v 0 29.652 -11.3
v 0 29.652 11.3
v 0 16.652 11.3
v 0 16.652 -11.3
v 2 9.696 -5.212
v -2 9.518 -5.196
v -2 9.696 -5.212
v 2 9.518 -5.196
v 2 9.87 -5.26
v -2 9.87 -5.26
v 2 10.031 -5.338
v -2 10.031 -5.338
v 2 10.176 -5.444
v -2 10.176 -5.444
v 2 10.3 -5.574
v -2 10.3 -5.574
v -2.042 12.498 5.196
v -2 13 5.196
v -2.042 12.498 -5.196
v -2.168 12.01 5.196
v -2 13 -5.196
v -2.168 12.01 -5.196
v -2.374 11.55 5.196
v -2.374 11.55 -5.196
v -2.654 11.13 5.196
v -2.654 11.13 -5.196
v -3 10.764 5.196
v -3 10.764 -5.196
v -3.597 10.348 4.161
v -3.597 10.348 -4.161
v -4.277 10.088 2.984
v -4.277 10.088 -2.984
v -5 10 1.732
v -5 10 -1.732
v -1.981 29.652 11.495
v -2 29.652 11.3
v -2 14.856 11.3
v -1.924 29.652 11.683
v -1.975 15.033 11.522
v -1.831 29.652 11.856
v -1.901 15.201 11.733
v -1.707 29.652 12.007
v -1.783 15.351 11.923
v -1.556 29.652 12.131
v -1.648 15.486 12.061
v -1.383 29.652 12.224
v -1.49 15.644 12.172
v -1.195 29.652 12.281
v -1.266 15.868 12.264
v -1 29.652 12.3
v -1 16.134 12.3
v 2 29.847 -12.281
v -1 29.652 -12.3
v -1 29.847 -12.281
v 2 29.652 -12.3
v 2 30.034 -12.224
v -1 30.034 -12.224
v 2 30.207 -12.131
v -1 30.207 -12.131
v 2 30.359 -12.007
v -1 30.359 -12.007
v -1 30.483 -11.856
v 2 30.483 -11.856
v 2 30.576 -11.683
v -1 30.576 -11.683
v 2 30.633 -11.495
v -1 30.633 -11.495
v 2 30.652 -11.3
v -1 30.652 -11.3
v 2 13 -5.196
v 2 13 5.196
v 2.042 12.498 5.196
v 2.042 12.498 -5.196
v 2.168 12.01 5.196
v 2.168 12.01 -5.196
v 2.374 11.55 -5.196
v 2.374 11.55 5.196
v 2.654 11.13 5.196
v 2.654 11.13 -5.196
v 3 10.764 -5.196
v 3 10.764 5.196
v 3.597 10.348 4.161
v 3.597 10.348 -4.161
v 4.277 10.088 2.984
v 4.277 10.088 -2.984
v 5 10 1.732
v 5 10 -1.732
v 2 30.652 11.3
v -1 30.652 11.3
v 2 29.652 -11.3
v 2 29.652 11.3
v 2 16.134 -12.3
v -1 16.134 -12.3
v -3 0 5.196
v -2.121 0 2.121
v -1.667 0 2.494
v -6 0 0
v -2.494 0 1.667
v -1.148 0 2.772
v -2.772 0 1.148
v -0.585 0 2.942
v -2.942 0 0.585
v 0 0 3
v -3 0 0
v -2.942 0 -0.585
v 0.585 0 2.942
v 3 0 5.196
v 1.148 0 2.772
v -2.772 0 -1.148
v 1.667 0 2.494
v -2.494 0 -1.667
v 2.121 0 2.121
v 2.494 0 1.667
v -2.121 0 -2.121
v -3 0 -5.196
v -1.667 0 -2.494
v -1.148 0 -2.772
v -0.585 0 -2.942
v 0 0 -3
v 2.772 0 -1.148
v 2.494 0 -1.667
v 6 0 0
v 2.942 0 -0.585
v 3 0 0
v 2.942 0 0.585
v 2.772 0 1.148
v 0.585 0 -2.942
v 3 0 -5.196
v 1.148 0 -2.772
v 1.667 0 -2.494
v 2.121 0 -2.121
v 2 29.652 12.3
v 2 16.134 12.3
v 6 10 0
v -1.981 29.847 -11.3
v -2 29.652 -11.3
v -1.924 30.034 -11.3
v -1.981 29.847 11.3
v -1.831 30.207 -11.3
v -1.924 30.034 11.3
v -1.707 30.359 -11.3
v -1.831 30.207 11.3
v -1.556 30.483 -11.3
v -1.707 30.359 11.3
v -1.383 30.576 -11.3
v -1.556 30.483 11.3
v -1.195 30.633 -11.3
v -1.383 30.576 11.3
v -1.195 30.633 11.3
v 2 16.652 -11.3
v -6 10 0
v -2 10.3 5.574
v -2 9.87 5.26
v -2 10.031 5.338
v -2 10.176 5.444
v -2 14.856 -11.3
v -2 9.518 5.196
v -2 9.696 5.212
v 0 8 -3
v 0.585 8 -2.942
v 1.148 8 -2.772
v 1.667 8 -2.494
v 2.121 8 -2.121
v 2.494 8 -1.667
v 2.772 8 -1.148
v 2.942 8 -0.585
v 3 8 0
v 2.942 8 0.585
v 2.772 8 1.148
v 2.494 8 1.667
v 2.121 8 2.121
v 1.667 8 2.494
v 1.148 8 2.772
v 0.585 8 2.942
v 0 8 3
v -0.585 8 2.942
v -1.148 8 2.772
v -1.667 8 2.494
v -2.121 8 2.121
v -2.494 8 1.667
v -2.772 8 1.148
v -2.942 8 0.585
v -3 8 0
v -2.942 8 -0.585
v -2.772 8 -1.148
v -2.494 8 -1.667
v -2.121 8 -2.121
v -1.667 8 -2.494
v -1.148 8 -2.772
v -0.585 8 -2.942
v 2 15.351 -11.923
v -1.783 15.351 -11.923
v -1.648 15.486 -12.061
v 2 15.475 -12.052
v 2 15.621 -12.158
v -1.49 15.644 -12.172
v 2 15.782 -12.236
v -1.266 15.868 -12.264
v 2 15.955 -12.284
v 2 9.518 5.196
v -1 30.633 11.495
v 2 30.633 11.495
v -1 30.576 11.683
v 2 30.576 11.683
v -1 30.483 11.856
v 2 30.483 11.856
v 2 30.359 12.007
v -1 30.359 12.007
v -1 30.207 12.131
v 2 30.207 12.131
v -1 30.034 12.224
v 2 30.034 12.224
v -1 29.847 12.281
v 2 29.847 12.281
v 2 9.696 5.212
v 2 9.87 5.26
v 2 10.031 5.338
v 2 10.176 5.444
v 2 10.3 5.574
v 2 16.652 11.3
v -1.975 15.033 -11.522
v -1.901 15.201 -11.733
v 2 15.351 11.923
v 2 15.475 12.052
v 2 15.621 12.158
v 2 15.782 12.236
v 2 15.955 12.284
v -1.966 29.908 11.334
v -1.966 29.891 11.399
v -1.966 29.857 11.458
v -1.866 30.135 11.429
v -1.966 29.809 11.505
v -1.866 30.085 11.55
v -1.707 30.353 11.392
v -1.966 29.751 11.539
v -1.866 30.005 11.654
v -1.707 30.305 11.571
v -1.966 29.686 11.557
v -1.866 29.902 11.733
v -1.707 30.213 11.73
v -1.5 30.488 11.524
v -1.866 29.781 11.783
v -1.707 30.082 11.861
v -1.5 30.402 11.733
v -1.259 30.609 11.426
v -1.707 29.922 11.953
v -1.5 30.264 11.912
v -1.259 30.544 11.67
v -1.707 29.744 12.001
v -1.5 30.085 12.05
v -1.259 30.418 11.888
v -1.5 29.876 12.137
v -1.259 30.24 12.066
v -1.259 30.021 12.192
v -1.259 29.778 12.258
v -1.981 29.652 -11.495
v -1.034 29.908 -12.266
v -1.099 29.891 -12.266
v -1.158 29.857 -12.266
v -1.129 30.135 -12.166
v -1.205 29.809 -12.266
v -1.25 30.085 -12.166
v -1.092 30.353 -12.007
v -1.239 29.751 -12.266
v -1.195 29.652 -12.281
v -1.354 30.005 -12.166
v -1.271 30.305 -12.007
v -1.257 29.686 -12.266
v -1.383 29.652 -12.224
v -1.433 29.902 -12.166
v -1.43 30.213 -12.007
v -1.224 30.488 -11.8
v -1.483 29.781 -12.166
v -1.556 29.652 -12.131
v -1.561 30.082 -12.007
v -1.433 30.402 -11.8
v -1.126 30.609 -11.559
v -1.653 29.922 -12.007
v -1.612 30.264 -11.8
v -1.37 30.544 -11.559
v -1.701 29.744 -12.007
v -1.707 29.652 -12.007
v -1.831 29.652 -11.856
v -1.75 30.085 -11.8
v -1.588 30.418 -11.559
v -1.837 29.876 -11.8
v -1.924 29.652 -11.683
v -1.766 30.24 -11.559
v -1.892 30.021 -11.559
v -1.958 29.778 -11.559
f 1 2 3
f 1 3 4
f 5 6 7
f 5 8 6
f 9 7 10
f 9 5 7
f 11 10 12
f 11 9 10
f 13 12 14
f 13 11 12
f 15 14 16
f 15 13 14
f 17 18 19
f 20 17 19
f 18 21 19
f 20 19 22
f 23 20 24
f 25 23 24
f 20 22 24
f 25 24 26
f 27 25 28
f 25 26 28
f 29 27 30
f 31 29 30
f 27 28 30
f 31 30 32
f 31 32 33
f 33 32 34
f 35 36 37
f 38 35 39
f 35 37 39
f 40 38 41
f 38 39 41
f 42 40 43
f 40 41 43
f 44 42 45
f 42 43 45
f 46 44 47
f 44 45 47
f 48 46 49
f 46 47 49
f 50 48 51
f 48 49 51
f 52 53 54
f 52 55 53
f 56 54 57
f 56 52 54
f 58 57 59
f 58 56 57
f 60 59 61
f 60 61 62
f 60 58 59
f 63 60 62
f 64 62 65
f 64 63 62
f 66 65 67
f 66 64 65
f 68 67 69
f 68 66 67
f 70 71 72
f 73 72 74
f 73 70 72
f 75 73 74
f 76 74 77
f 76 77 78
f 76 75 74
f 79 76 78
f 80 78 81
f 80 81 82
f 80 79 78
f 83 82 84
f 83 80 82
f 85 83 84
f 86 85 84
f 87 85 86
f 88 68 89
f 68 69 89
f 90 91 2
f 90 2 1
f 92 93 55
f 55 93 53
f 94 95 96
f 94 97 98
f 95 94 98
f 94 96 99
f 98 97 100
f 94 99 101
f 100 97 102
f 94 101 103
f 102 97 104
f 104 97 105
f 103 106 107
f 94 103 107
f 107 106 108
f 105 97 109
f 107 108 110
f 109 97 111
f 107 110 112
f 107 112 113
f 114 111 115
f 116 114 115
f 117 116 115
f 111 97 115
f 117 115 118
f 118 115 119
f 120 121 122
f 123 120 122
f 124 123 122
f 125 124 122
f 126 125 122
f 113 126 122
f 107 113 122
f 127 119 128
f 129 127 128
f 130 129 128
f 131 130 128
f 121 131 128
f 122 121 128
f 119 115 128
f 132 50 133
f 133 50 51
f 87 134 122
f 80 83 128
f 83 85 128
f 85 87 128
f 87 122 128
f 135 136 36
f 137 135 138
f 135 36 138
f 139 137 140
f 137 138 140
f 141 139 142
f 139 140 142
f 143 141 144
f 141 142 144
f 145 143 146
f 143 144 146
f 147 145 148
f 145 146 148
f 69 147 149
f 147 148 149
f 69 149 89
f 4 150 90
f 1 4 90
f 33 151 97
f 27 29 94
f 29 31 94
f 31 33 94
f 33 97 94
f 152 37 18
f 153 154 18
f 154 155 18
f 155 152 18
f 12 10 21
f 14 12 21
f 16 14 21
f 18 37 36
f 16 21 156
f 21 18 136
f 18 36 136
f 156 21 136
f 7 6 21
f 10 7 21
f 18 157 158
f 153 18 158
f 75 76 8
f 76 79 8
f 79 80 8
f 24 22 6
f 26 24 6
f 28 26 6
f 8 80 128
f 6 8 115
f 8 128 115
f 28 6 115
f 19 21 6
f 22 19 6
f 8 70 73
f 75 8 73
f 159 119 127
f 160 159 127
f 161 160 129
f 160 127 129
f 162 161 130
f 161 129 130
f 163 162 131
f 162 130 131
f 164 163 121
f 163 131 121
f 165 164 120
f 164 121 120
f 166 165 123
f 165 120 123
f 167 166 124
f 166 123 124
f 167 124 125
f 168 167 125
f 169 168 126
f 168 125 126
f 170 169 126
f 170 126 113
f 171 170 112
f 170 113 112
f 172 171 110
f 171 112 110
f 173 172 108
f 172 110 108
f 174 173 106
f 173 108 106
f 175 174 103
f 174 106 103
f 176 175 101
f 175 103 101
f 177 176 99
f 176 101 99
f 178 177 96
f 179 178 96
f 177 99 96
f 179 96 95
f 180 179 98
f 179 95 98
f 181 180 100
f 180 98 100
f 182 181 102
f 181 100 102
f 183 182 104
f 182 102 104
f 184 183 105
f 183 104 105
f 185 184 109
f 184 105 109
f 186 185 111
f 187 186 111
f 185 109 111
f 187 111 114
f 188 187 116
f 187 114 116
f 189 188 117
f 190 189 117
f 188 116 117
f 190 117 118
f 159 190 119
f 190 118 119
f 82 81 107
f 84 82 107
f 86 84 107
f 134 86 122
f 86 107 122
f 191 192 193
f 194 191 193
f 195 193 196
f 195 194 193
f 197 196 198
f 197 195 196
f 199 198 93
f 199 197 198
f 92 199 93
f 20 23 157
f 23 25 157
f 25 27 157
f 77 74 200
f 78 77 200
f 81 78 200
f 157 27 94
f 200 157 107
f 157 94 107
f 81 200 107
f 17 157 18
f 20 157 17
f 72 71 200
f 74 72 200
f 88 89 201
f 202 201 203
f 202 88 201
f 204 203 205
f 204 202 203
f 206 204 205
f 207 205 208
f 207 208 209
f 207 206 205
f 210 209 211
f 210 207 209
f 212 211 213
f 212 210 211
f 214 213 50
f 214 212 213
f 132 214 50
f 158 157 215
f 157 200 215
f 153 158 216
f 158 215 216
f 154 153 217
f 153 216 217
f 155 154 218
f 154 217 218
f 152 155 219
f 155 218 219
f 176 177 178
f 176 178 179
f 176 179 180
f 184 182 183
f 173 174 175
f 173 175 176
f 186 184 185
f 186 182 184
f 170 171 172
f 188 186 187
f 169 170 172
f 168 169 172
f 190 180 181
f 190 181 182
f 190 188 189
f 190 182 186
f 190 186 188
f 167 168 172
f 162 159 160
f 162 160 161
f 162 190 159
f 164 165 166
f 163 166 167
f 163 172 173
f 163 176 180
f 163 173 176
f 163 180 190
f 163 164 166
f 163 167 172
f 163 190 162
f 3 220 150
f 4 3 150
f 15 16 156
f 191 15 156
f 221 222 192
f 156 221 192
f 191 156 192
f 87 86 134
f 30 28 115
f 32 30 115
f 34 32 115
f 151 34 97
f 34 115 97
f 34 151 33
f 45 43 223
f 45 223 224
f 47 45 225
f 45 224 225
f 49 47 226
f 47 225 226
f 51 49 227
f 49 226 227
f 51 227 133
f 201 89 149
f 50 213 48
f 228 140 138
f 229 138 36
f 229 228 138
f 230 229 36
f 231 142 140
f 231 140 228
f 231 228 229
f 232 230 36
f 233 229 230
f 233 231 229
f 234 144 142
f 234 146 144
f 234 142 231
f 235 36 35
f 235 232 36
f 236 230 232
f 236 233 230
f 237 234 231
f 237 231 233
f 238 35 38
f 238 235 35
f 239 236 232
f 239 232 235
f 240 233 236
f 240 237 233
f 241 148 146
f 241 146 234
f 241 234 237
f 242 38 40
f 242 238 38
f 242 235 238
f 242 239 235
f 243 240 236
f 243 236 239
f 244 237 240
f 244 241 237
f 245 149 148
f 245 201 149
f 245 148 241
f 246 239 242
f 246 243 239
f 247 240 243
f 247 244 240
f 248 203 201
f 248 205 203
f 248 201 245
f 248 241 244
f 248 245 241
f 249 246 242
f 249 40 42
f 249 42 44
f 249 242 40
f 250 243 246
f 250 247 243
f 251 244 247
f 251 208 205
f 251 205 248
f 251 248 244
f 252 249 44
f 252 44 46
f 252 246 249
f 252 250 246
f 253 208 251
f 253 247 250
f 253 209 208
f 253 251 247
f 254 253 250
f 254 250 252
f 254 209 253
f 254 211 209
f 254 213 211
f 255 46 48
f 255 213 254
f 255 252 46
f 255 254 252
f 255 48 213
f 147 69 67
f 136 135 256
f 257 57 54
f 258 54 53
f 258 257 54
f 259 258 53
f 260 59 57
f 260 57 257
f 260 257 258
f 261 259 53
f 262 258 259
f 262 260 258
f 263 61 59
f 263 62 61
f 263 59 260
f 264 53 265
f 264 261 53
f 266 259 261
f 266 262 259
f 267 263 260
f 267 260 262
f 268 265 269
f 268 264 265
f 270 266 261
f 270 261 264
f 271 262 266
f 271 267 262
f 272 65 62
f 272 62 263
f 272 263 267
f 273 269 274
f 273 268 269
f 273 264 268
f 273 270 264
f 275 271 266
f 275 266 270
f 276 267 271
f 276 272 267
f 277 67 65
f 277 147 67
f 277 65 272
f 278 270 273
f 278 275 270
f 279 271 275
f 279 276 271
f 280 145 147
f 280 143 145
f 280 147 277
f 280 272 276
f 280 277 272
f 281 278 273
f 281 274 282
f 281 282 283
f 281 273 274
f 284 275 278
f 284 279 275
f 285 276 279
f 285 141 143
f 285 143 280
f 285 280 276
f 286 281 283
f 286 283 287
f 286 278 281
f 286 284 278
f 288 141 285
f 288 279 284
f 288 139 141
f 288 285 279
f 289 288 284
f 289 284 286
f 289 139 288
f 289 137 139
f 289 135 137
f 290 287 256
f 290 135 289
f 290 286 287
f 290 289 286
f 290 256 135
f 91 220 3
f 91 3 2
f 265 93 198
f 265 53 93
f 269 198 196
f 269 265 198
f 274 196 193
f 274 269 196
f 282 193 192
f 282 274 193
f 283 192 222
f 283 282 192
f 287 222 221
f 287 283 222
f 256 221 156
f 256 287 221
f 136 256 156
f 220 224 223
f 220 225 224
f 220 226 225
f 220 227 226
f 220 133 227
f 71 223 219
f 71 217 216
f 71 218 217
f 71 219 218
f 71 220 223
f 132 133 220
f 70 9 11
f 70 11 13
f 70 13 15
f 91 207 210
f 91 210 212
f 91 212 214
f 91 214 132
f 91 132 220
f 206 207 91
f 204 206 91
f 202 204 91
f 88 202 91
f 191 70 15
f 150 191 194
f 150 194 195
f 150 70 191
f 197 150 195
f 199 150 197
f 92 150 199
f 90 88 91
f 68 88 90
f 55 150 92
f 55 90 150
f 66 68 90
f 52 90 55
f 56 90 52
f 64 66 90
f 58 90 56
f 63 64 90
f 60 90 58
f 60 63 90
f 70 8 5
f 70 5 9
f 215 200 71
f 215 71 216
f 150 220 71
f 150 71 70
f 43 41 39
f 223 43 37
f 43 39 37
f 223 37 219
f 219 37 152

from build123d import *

# Parameters (mm, degrees)
BOSS_EXTRUDE1_DEPTH      = 10
SKETCH2_R                = 3
CUT_EXTRUDE1_DEPTH       = 8
BOSS_EXTRUDE2_DEPTH      = 2
BOSS_EXTRUDE2_DEPTH_BACK = 2
SKETCH4_W                = 22.6
SKETCH4_H                = 13
CUT_EXTRUDE3_DEPTH       = 2
FILLET1_R                = 1
FILLET2_R                = 3


with BuildPart() as part:
    # Sketch1 → Boss-Extrude1 (new body)
    with BuildSketch(Plane(origin=(0, 0, 0), x_dir=(1, 0, 0), z_dir=(0, 1, 0))):
        Polygon((6, 0), (3, 5.196152423), (-3, 5.196152423), (-6, 0), (-3, -5.196152423), (3, -5.196152423), align=None)
    extrude(amount=BOSS_EXTRUDE1_DEPTH)

    # Sketch2 → Cut-Extrude1 (cut)
    with BuildSketch(Plane.XZ):
        Circle(SKETCH2_R)
    extrude(amount=-CUT_EXTRUDE1_DEPTH, mode=Mode.SUBTRACT)

    # Sketch3 → Boss-Extrude2 (add, two sides: drawn at the far end of the back side and taken through both)
    with BuildSketch(Plane(origin=(0, 0, 0), x_dir=(0, 0, -1), z_dir=(1, 0, 0)).offset(-BOSS_EXTRUDE2_DEPTH_BACK)):
        Polygon((5.196152423, 10), (12.3, 15.651732035), (12.3, 30.651732035), (-12.3, 30.651732035), (-12.3, 15.651732035), (-5.196152423, 10), align=None)
    extrude(amount=BOSS_EXTRUDE2_DEPTH + BOSS_EXTRUDE2_DEPTH_BACK)

    # Sketch4 → Cut-Extrude3 (cut)
    with BuildSketch(Plane(origin=(2, 0, 0), x_dir=(0, 0, -1), z_dir=(1, 0, 0))):
        with Locations((0, 23.151732035)):
            Rectangle(SKETCH4_W, SKETCH4_H)
    extrude(amount=-CUT_EXTRUDE3_DEPTH, mode=Mode.SUBTRACT)

    # Fillet1
    fillet1_edges = [part.edges().sort_by_distance(p)[0] for p in [
        (-2, 23.151732035, -12.3),
        (-2, 30.651732035, 0),
        (-2, 23.151732035, 12.3),
        (0, 10, -5.196152423),
        (0, 10, 5.196152423),
        (0, 15.651732035, 12.3),
        (0, 15.651732035, -12.3),
        (0, 30.651732035, -12.3),
        (0, 30.651732035, 12.3),
    ]]
    fillet(fillet1_edges, radius=FILLET1_R)

    # Fillet2
    fillet2_edges = [part.edges().sort_by_distance(p)[0] for p in [
        (-2, 10, 0),
        (2, 10, 0),
    ]]
    fillet(fillet2_edges, radius=FILLET2_R)


solid = part.part
